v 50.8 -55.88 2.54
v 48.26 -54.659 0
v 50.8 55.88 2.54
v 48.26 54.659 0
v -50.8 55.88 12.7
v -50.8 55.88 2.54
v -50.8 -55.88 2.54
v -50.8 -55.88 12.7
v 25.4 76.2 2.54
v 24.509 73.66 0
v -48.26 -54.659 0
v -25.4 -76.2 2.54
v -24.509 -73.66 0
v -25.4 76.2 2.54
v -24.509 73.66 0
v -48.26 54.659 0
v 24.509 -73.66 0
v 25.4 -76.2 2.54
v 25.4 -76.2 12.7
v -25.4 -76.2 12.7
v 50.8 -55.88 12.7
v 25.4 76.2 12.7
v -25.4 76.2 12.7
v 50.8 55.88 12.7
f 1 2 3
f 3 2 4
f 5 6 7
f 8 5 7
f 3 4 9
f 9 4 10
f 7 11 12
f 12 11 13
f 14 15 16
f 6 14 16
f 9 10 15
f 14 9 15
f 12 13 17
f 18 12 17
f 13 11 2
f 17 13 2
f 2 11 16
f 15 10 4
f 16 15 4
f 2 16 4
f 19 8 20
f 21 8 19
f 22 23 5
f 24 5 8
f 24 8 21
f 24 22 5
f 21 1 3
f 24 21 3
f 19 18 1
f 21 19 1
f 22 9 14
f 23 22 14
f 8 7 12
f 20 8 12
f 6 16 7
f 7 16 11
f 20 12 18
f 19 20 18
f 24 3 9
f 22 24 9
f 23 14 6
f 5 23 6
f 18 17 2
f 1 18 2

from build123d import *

# Parameters (mm, degrees)
F1_DEPTH = 12.7
F2_SIZE  = 2.54


with BuildPart() as f1:
    # F0 (on Top) → F1 (new body)
    with BuildSketch(Plane.XY):
        Polygon((0, 76.2), (0, 0), (50.8, 0), (50.8, 55.88), (25.4, 76.2), align=None)
        Polygon((-50.8, 0), (0, 0), (0, 76.2), (-25.4, 76.2), (-50.8, 55.88), align=None)
        Polygon((0, -76.2), (0, 0), (-50.8, 0), (-50.8, -55.88), (-25.4, -76.2), align=None)
        Polygon((50.8, 0), (0, 0), (0, -76.2), (25.4, -76.2), (50.8, -55.88), align=None)
    extrude(amount=F1_DEPTH)

    # F2
    f2_edges = [f1.edges().sort_by_distance(p)[0] for p in [
        (50.8, 0, 0),
        (38.1, 66.04, 0),
        (0, 76.2, 0),
        (-38.1, 66.04, 0),
        (-50.8, 0, 0),
        (-38.1, -66.04, 0),
        (0, -76.2, 0),
        (38.1, -66.04, 0),
    ]]
    chamfer(f2_edges, length=F2_SIZE)


solid = f1.part
